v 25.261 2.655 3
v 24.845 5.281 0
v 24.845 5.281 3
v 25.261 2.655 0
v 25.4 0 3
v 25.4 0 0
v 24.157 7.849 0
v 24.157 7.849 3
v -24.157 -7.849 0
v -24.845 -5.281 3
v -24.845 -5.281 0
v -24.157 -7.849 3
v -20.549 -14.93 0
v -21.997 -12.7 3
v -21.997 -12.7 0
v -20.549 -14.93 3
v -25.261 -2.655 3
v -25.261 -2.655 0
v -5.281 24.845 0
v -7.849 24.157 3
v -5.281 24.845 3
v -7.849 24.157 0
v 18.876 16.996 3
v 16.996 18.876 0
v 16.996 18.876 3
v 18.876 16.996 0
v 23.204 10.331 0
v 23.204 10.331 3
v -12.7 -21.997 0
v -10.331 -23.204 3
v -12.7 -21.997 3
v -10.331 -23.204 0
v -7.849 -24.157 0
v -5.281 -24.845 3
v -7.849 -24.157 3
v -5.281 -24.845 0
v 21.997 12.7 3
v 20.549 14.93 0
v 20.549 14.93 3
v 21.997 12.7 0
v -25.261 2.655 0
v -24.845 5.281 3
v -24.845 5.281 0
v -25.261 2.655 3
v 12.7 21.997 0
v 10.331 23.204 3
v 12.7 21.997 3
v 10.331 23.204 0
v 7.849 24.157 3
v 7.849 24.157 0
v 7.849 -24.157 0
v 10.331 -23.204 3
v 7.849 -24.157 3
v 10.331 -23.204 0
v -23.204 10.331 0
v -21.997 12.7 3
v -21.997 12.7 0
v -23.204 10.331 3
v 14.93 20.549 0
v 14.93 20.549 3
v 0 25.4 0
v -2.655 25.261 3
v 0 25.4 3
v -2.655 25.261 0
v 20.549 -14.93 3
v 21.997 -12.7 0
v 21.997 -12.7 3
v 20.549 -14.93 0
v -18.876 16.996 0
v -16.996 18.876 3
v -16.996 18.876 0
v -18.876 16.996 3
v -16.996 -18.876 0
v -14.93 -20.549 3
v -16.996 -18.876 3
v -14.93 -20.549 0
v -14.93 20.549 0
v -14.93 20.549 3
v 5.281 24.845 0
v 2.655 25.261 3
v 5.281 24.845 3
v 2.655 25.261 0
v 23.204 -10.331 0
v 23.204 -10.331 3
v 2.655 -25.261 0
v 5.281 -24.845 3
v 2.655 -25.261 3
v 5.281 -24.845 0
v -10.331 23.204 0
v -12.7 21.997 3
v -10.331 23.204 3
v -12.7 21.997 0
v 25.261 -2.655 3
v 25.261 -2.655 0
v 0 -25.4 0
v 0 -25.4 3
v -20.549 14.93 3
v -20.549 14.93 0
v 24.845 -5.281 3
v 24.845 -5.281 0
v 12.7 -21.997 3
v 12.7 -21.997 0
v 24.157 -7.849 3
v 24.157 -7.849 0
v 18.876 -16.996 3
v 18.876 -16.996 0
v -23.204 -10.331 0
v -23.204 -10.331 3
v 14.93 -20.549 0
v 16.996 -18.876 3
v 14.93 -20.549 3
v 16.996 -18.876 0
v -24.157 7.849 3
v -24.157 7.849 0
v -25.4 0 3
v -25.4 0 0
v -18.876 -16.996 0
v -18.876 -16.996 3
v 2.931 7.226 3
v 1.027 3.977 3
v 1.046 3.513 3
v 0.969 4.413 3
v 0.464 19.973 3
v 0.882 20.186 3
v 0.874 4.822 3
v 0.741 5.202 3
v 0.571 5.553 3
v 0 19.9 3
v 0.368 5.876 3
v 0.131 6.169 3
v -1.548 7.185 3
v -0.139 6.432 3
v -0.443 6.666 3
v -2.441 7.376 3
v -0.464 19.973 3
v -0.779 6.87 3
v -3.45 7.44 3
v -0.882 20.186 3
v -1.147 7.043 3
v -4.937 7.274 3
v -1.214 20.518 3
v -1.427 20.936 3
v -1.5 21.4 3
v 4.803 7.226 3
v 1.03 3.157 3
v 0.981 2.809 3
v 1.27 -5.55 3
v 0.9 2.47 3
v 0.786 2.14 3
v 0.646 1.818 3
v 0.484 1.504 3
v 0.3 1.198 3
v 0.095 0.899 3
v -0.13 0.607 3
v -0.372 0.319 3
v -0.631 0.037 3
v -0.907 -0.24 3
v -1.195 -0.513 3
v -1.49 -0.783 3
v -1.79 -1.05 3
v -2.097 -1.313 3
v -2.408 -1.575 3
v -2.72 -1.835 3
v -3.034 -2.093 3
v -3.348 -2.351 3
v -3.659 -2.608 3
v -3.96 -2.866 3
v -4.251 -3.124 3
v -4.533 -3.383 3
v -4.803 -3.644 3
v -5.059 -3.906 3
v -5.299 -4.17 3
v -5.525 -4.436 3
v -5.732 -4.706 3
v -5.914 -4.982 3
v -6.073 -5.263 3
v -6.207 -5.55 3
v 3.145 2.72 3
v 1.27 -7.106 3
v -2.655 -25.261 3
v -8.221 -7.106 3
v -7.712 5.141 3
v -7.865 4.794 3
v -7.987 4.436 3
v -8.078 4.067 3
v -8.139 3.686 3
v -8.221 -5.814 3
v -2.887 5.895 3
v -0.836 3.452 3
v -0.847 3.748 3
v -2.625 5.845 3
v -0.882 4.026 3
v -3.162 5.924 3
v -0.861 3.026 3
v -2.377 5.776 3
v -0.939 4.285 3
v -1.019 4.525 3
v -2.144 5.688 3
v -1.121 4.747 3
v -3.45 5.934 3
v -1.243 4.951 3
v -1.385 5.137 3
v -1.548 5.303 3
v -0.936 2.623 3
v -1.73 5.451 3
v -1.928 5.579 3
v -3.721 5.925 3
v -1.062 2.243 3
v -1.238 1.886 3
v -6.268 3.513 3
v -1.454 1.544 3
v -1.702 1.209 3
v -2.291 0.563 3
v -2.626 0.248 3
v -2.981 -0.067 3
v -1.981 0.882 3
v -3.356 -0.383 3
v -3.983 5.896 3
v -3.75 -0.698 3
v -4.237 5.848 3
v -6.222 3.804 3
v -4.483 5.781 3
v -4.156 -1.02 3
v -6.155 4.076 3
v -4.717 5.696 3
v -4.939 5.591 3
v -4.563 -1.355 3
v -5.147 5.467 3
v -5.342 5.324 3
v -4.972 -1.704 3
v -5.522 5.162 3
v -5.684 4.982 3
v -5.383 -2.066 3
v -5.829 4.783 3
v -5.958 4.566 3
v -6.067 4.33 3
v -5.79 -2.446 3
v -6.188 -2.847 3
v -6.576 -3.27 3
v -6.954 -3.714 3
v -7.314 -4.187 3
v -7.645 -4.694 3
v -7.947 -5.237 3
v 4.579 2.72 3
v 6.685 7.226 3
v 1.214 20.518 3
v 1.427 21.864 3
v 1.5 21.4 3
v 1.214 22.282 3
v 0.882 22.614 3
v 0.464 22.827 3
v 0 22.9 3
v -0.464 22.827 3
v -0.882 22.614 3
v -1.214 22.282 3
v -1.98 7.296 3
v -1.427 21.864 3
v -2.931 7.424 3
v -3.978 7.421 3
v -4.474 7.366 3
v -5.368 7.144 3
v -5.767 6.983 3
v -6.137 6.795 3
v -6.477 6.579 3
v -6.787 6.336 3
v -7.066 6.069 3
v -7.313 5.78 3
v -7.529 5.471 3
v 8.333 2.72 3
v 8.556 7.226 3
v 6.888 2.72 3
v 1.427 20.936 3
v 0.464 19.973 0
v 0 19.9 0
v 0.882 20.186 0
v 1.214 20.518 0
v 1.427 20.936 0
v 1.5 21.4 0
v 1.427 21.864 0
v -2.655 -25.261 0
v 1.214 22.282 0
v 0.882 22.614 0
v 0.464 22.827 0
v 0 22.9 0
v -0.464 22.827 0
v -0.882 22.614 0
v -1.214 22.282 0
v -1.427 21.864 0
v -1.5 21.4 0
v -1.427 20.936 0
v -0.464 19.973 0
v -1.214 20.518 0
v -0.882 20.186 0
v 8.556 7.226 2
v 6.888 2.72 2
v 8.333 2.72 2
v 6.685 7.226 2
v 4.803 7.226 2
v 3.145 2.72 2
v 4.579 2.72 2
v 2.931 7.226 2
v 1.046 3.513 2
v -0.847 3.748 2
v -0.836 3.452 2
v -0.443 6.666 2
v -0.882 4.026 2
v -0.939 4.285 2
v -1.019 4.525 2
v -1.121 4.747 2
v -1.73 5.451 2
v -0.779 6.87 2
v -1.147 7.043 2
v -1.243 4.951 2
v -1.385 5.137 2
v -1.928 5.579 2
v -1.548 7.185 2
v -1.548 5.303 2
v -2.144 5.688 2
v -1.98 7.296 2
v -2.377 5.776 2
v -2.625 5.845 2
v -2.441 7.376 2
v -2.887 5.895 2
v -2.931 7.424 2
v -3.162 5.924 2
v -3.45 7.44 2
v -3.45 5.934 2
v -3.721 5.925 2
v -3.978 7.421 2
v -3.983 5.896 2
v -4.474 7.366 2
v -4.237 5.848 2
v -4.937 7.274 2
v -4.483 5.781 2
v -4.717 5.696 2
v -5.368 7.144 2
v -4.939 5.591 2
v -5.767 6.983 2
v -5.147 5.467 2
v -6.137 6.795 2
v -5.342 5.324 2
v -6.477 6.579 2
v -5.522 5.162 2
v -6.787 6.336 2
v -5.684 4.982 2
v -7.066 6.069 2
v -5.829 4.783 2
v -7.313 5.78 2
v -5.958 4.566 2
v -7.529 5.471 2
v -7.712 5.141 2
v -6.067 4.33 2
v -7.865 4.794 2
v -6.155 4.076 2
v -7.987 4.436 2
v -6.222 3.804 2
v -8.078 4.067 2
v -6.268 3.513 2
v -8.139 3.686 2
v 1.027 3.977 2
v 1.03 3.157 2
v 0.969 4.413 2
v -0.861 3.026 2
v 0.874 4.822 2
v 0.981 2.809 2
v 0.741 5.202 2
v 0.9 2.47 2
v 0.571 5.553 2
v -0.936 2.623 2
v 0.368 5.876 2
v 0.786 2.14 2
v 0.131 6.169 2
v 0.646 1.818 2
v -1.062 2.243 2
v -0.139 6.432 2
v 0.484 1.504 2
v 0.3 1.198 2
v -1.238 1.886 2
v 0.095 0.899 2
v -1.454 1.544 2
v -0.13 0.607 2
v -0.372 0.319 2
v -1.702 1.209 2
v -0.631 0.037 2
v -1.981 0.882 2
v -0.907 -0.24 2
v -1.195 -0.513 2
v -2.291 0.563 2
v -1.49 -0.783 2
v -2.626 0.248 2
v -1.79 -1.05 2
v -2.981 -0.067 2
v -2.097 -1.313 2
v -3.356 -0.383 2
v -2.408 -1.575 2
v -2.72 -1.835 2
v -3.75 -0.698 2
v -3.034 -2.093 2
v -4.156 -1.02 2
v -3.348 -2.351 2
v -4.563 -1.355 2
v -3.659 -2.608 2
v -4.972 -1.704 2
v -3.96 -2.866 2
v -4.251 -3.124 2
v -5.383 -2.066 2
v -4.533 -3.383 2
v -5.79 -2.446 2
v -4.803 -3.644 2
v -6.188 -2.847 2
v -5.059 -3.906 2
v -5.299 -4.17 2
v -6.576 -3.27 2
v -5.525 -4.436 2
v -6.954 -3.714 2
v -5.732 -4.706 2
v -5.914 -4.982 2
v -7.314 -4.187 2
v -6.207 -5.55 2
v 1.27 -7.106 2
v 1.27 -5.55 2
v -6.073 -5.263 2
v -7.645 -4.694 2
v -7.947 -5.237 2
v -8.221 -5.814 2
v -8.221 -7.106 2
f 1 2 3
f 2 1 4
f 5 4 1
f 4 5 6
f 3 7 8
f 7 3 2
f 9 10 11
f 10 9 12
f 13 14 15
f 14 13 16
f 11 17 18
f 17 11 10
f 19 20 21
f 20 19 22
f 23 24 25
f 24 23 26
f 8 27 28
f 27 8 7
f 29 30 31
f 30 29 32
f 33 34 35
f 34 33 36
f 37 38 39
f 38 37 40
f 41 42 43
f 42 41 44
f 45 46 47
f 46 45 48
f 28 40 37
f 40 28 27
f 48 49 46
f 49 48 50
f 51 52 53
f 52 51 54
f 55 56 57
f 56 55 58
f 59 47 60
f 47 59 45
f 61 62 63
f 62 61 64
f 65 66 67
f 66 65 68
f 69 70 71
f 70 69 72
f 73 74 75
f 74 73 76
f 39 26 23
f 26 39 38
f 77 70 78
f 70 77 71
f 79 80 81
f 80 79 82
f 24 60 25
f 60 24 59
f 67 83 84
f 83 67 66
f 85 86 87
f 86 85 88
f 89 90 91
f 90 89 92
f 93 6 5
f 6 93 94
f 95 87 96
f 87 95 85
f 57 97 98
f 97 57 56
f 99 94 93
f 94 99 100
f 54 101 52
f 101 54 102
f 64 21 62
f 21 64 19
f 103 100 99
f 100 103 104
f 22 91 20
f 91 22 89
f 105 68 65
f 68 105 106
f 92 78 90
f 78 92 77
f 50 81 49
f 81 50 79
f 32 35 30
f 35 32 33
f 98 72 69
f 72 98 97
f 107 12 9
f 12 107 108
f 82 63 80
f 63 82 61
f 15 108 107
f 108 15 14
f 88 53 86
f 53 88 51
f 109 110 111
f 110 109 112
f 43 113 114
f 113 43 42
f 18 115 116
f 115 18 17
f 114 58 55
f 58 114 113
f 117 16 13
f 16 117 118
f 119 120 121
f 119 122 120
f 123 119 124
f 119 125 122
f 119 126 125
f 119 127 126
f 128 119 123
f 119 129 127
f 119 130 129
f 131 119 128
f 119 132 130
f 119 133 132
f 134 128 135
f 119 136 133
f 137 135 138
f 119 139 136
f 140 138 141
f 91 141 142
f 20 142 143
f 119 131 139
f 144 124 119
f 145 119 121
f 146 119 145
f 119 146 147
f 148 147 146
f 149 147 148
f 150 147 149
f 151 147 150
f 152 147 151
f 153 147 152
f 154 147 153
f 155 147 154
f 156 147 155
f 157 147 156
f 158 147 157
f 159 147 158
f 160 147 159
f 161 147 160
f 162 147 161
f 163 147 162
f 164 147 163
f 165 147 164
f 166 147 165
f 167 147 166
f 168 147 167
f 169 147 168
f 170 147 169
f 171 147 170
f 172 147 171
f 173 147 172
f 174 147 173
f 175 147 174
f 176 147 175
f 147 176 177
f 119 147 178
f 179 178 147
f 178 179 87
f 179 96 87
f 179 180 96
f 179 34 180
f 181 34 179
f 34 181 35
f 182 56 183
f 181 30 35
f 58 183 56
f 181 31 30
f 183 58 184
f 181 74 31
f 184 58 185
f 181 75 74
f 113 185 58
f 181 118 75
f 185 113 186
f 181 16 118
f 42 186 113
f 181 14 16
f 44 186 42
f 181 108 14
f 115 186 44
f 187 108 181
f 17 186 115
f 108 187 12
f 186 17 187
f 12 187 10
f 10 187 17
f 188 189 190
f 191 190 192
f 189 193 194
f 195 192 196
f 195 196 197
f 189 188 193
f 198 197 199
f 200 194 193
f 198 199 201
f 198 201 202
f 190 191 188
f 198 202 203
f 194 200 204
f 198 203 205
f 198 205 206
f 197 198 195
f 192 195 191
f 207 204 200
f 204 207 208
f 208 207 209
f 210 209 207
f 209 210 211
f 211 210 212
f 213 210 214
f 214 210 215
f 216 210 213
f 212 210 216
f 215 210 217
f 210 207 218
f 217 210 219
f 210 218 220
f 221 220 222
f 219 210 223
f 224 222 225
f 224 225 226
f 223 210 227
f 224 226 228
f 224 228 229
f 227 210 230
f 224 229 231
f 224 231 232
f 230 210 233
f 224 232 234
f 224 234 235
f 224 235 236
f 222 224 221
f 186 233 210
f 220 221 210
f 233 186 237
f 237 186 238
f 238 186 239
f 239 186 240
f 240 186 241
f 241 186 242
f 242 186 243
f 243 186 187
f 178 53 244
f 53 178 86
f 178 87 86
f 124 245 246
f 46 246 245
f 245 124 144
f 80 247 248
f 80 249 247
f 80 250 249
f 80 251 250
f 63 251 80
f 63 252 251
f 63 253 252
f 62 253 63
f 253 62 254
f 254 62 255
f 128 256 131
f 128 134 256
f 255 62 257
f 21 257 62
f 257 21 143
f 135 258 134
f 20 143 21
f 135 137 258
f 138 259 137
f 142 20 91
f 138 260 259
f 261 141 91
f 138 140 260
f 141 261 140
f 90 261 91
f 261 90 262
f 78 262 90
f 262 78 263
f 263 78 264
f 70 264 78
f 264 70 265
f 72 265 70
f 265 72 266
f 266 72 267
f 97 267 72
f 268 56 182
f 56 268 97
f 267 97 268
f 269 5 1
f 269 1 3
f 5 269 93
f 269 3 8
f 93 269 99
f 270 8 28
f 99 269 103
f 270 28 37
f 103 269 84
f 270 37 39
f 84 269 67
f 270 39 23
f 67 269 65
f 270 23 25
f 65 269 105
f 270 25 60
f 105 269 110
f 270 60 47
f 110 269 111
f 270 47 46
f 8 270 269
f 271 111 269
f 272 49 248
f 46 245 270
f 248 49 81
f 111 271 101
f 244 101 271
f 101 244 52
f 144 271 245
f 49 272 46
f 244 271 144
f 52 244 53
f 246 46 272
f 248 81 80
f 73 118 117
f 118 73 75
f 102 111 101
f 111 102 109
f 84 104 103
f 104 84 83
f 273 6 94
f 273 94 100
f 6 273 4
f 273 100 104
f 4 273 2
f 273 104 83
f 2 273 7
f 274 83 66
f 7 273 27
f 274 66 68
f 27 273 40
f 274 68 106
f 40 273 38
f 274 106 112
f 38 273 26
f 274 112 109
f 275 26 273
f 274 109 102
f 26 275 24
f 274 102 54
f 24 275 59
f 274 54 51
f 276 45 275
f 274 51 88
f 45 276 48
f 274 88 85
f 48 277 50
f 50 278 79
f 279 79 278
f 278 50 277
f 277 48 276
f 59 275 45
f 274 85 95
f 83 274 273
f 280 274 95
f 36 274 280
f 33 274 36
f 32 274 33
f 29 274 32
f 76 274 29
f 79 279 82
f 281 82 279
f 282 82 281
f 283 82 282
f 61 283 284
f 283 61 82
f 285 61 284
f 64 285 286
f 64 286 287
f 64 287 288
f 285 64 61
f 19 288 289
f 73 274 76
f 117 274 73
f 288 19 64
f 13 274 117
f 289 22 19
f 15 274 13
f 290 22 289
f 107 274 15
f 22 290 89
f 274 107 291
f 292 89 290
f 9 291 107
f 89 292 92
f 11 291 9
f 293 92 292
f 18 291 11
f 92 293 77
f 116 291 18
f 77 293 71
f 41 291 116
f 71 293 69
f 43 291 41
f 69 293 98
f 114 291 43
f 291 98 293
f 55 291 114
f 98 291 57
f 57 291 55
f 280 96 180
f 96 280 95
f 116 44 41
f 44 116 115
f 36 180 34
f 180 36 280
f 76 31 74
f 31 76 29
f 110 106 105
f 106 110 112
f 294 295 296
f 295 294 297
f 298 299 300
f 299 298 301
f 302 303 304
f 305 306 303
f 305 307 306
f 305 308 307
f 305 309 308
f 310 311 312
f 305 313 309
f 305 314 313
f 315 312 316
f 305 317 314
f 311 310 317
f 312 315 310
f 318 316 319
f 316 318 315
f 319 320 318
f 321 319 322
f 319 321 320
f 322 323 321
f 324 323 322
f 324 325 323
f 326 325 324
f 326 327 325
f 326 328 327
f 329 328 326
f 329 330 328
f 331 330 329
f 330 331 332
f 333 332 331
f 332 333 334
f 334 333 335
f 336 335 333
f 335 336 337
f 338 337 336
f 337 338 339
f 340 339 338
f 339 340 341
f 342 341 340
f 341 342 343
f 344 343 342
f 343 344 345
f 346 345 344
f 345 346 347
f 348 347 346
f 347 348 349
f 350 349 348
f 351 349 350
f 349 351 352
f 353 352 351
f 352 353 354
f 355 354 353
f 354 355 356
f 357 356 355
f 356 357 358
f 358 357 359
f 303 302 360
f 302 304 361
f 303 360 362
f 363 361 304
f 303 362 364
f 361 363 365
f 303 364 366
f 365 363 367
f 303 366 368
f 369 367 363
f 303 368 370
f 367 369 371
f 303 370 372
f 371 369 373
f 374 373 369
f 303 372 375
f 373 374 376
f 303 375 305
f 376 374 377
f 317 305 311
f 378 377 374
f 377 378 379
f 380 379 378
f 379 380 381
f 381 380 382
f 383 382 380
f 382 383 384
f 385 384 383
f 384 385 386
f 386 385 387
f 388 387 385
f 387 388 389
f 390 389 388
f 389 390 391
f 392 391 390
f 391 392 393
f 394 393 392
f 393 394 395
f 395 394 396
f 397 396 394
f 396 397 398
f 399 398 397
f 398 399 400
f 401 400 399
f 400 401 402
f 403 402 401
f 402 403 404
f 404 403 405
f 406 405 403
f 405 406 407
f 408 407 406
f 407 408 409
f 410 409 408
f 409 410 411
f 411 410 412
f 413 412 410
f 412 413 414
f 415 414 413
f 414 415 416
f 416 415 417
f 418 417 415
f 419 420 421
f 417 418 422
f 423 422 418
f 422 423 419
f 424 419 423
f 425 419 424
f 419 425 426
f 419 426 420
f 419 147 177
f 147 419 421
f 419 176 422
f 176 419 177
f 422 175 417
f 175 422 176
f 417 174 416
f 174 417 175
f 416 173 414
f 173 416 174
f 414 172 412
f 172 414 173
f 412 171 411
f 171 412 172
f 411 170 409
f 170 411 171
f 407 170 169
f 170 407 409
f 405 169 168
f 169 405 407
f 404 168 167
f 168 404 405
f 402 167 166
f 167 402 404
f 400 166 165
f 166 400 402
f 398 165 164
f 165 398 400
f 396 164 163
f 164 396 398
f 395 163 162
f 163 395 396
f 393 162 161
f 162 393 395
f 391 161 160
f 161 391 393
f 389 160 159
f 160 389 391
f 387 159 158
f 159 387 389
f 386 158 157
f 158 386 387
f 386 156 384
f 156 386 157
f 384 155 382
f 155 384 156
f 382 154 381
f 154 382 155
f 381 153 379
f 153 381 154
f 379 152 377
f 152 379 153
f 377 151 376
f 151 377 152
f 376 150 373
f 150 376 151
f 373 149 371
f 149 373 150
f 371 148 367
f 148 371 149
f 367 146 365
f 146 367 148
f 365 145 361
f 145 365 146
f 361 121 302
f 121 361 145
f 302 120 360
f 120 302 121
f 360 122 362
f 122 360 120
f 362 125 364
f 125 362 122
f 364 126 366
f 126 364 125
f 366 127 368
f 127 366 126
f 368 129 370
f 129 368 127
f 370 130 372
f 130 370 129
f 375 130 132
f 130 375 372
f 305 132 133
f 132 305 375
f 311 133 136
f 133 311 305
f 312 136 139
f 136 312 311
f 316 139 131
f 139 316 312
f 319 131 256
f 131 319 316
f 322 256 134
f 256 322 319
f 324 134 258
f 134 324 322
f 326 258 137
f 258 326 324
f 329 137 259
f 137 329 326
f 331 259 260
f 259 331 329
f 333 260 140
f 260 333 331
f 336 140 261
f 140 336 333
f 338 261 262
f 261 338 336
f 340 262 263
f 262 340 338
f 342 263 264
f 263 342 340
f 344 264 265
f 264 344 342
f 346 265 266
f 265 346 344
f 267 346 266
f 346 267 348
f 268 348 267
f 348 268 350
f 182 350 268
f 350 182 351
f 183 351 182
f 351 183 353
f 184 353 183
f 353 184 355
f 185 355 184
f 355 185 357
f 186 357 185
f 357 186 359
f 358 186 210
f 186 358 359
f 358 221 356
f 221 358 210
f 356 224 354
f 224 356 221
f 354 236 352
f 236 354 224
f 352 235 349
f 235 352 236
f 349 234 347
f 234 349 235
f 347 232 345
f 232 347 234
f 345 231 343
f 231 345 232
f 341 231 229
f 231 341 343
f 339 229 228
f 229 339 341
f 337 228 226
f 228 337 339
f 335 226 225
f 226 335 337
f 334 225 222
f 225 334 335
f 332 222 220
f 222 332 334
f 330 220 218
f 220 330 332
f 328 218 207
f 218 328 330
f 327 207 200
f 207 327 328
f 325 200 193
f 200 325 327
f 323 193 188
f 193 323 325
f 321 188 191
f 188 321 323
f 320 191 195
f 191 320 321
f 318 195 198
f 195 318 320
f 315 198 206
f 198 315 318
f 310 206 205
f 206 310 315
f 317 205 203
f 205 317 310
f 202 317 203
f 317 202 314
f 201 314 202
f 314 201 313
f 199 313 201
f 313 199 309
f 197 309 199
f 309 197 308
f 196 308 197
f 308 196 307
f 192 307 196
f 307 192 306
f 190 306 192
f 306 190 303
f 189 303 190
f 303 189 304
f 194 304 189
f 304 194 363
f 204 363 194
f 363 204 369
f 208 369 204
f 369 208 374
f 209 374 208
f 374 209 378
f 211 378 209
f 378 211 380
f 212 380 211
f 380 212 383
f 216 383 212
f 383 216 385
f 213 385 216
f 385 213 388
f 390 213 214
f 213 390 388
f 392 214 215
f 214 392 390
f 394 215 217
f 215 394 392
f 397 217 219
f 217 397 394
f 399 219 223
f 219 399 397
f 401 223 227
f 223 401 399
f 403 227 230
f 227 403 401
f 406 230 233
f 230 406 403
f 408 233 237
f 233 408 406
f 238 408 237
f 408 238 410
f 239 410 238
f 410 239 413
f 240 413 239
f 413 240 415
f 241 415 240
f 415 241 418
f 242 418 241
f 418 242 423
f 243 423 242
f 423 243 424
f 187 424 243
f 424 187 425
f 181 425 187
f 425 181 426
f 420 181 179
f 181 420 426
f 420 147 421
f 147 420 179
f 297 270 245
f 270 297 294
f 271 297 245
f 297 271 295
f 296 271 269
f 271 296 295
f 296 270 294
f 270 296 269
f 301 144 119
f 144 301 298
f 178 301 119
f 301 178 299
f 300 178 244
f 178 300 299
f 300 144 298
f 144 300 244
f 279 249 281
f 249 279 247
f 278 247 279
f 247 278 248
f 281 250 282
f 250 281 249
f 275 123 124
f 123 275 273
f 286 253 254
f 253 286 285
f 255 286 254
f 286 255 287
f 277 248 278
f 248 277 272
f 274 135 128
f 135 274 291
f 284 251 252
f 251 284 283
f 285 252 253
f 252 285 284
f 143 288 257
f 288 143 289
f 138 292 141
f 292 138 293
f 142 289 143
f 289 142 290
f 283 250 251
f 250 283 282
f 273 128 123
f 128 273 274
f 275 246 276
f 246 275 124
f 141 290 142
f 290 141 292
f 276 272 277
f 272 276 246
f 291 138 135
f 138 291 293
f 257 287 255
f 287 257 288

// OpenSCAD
diameter_inches = 2;
diameter = diameter_inches * 25.4;
radius = diameter/2;
height = 3;
holediameter = 3;
//¼   ½   ¾
//2, 2.5, 3, 3.5

text = "2\"";
difference()
{
    cylinder(d=diameter, h = height, $fn=60);
    label();
    //notches();
    hole();
};


module label()
{
    translate([0,0,height - 1])
    {
        linear_extrude(height = 5) 
        {
              text( 
                    text, 
                    size = 15,
                    halign = "center", 
                    valign = "center");
        };
    }
}

module hole()
{
    //translate([-(radius - 4) / sqrt(2),(radius - 4) / sqrt(2),0], $fn=20)
    translate([0,(radius - 4),0], $fn=20)
    {
        cylinder(d=holediameter, h= height + 1);
    };
}

notchsize = 1;

module notches()
{
    translate([radius, 0, 0])
    {
        rotate([0,0,45])
        {
            cube([notchsize,notchsize,height * 2], center=true);
        }
    }
    translate([-radius, 0, 0])
    {
        rotate([0,0,45])
        {
            cube([notchsize,notchsize,height * 2], center=true);
        }
    }
    translate([0, radius, 0])
    {
        rotate([0,0,45])
        {
            cube([notchsize,notchsize,height * 2], center=true);
        }
    }
    translate([0, -radius, 0])
    {
        rotate([0,0,45])
        {
            cube([notchsize,notchsize,height * 2], center=true);
        }
    }
    
}
